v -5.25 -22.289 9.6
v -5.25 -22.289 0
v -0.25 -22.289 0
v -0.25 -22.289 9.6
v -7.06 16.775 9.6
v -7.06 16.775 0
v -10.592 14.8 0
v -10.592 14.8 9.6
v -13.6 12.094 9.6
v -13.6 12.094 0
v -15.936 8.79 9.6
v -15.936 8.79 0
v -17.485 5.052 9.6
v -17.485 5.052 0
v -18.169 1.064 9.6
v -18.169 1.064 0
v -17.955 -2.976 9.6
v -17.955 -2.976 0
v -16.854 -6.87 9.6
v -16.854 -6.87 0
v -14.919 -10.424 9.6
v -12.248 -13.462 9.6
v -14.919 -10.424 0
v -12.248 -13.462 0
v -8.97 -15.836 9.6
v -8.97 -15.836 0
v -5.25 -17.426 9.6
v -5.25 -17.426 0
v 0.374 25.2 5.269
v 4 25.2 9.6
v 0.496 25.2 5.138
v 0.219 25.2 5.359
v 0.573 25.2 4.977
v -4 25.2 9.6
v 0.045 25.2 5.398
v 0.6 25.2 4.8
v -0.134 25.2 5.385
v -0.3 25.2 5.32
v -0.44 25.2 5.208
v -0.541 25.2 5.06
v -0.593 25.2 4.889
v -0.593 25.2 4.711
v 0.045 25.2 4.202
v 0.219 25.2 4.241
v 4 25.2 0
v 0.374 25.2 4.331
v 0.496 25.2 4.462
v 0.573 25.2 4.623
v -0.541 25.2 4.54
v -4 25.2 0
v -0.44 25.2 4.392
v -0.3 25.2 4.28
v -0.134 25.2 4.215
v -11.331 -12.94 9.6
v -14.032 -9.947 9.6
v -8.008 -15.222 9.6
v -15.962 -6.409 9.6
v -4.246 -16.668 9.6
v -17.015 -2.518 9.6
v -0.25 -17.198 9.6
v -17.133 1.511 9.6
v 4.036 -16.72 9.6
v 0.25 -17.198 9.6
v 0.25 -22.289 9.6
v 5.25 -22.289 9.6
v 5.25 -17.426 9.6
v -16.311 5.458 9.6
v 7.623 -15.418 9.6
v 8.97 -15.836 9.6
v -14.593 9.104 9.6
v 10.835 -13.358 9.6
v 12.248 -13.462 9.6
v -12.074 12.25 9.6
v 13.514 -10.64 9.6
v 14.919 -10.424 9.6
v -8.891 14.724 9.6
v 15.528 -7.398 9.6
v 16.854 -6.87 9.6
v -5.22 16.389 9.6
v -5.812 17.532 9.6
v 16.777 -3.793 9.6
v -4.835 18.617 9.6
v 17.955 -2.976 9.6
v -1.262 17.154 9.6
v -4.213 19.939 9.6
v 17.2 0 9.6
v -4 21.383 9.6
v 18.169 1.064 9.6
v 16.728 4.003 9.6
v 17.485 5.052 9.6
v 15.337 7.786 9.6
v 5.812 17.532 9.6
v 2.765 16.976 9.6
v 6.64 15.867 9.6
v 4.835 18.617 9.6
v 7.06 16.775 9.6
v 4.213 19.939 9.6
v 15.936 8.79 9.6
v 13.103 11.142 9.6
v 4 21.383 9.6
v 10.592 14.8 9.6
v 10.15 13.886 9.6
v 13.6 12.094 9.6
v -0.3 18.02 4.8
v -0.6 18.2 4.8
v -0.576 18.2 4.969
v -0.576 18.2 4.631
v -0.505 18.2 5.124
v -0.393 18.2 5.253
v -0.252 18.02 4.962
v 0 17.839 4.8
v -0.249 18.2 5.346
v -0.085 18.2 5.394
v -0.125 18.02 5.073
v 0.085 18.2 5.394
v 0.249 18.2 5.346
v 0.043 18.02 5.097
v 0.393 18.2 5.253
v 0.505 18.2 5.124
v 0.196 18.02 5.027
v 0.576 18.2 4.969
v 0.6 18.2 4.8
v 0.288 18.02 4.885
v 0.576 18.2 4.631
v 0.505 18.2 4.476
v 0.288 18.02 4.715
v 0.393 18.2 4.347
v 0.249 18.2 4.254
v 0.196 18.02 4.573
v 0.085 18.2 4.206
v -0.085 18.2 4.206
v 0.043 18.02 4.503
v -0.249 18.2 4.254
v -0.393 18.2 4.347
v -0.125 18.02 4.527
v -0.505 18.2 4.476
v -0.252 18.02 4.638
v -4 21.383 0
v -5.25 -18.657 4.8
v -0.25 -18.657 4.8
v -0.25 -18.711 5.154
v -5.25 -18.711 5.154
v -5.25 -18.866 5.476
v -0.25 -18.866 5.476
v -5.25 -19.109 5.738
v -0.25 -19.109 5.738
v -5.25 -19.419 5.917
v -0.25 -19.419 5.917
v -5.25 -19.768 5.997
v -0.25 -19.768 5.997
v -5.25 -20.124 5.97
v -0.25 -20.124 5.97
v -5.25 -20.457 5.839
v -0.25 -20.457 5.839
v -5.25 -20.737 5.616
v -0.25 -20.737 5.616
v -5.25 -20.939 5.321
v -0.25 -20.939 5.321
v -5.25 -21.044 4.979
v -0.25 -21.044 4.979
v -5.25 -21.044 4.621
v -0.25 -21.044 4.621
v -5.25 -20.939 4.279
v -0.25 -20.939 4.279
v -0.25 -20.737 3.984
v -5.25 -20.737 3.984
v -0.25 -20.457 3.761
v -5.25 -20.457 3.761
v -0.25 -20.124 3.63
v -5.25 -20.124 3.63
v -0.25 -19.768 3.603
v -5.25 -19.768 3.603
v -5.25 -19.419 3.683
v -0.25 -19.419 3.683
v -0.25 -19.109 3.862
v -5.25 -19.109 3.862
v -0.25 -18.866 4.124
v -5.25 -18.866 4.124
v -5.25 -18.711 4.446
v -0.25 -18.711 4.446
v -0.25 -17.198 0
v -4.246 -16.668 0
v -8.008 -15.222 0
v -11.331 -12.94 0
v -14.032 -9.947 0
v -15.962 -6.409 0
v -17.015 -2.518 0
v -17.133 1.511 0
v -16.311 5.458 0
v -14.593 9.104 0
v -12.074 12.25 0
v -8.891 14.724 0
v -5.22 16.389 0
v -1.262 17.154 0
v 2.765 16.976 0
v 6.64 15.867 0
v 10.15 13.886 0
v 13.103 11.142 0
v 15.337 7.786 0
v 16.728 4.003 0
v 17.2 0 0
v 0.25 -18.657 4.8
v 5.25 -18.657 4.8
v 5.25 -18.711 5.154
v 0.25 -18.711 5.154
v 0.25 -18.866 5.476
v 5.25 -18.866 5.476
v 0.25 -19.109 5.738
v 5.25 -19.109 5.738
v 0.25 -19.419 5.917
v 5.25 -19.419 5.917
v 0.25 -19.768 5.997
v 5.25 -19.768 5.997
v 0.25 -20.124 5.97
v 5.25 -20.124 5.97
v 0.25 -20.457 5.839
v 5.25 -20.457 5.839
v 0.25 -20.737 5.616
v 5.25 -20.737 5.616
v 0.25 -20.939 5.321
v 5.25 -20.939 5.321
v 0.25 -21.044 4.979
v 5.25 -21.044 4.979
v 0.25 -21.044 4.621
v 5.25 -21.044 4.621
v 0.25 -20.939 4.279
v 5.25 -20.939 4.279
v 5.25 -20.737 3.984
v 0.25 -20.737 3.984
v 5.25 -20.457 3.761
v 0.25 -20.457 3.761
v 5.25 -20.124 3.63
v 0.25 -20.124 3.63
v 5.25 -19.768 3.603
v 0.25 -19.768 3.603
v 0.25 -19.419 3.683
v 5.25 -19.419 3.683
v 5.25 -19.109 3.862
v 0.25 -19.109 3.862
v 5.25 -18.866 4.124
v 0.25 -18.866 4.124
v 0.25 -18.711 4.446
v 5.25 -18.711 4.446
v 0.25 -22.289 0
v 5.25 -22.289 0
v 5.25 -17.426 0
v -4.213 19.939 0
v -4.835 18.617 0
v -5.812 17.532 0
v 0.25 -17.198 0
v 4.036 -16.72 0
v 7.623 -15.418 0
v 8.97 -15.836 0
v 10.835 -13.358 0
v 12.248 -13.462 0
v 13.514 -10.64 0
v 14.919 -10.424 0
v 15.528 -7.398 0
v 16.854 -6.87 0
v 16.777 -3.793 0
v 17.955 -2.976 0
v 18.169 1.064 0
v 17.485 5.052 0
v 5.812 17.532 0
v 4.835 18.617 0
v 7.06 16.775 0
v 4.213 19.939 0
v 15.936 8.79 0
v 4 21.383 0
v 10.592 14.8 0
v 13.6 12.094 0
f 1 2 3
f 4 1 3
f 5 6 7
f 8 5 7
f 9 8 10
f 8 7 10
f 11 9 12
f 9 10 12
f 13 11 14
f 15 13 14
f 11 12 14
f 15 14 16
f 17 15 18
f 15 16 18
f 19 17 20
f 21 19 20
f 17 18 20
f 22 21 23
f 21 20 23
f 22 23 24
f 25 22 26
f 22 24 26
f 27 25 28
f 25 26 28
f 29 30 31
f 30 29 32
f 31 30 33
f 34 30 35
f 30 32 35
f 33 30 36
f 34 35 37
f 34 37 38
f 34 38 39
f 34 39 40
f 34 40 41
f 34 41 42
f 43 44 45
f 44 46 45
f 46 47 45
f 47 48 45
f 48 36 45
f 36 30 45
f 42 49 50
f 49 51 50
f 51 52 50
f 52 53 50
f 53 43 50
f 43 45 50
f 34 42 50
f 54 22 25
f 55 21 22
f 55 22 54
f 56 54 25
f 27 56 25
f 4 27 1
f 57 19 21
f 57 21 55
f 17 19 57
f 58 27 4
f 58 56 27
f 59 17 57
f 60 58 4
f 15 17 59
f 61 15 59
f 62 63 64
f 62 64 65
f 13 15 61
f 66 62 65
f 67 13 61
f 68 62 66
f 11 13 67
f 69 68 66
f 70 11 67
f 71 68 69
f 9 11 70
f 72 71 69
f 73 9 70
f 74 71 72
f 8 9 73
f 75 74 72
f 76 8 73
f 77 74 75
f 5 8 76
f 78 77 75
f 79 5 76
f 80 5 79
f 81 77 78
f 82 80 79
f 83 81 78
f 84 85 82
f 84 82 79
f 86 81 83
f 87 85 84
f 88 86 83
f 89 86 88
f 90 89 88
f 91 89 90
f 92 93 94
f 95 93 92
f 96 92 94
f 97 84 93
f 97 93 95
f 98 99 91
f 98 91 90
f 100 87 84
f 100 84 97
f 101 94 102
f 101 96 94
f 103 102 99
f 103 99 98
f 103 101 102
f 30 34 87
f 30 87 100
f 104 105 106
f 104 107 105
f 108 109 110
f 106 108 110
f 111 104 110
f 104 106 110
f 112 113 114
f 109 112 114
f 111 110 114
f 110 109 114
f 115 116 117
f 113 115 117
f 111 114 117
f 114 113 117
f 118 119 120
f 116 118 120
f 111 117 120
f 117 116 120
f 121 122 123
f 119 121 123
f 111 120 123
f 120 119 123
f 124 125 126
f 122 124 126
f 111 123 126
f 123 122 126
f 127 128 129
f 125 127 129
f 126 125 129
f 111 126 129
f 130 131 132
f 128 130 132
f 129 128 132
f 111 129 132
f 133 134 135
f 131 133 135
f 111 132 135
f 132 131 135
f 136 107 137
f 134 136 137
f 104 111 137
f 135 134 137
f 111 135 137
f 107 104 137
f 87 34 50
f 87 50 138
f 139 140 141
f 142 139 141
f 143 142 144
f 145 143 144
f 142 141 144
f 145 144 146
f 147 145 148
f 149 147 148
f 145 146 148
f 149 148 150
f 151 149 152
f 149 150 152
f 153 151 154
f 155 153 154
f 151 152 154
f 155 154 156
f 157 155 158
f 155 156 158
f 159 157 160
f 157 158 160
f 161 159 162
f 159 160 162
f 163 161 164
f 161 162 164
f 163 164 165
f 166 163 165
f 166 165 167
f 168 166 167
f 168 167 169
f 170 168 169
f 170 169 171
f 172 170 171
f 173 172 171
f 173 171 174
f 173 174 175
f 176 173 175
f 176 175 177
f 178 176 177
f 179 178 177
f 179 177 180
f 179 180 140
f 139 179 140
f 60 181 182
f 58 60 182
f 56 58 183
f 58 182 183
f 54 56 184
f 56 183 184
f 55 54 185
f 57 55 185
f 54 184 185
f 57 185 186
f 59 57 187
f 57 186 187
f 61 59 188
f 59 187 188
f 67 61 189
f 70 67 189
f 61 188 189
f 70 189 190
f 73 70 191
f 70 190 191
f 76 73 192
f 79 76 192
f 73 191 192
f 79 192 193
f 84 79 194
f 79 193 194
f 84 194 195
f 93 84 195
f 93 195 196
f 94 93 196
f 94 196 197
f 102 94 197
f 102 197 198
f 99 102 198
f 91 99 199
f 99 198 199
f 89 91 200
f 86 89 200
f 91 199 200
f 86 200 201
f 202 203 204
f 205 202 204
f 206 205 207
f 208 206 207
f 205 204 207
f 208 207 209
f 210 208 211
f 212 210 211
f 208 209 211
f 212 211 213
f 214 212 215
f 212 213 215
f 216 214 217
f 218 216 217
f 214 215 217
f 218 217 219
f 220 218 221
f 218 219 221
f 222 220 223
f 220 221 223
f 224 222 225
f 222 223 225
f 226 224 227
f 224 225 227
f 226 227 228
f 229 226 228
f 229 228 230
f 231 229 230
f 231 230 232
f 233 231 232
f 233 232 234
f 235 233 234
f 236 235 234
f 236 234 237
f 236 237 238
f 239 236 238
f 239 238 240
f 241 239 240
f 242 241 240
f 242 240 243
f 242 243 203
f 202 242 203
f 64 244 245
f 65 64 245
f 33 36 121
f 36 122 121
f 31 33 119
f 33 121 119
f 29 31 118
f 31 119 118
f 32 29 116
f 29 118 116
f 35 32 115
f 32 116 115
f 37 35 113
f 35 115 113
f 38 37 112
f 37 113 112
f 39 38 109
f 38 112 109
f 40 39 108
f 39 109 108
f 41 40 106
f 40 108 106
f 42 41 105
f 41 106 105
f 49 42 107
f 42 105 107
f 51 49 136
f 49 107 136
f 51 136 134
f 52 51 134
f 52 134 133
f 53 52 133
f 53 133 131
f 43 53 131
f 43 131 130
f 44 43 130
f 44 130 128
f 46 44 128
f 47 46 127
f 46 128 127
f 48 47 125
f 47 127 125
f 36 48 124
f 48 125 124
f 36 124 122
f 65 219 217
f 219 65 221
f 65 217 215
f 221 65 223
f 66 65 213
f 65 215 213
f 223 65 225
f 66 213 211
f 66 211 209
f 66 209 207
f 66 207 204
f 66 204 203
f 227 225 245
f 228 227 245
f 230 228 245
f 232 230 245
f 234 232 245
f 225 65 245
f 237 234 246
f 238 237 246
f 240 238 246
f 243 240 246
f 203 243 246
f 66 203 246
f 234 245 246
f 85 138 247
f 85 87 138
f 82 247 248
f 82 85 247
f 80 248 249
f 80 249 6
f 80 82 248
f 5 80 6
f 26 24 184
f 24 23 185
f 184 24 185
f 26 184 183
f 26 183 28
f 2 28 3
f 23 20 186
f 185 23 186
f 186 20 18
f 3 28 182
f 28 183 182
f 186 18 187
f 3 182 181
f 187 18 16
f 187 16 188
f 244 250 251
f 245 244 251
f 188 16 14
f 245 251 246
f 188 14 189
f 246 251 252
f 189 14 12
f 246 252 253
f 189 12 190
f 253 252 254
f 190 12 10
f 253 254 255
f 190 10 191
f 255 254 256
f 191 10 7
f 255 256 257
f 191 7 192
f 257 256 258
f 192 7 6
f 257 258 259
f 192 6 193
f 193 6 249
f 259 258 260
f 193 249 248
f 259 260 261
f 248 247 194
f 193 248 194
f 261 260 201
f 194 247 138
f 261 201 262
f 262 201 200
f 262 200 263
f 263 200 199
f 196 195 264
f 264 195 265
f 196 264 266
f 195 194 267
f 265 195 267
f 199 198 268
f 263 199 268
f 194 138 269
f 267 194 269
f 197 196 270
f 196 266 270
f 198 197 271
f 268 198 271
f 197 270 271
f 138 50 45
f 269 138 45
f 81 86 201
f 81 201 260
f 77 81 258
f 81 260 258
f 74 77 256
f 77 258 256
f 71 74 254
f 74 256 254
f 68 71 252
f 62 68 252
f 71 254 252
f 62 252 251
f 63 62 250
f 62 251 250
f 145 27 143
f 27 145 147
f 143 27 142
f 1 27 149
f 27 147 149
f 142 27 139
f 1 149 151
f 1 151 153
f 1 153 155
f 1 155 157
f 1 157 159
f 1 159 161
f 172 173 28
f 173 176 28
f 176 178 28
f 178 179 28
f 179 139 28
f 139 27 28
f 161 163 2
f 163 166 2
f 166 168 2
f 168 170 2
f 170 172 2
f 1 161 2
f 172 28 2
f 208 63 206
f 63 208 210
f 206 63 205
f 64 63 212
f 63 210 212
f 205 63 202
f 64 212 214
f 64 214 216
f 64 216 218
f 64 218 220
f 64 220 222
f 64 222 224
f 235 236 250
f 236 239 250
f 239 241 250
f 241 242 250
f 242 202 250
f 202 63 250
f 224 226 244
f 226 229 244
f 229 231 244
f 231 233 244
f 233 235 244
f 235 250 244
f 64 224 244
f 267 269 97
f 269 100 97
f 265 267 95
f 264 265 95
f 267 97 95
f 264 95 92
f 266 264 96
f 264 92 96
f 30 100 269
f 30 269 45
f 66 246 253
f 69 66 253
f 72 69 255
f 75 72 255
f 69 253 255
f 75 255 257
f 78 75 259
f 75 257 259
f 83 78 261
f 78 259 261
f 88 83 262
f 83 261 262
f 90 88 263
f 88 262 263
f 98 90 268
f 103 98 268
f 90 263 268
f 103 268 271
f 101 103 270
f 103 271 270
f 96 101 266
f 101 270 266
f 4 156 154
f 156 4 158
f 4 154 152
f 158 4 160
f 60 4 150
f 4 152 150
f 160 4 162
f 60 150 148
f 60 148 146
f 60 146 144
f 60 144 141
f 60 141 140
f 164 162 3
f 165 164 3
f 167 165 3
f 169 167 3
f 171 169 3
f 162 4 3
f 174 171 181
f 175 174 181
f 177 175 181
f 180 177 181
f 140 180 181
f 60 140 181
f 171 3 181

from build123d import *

# Parameters (mm, degrees)
F1_DEPTH = 9.6
F3_D     = 2.4
F5_D     = 1.2
F5_DEPTH = 7
F5_TIP   = 0.3605163714
F6_R     = 5


with BuildPart() as f1:
    # F0 (on Top) → F1 (new body)
    with BuildSketch(Plane.XY):
        with BuildLine():
            Line((-4, 25.2), (-4, 17.754999296))
            ThreePointArc((-4, 17.754999296), (0, 18.2), (4, 17.754999296))
            Line((4, 17.754999296), (4, 25.2))
            Line((4, 25.2), (-4, 25.2))
        make_face()
        with BuildLine():
            ThreePointArc((-0.25, -17.1981830436), (-12.0735247546, 12.2503061186), (17.2, 0))
            ThreePointArc((17.2, 0), (12.2503061186, -12.0735247546), (0.25, -17.1981830436))
            Line((0.25, -17.1981830436), (0.25, -18.198282886))
            ThreePointArc((0.25, -18.198282886), (2.7769537313, -17.986898787), (5.25, -17.4263449983))
            ThreePointArc((5.25, -17.4263449983), (18.1885230733, 0.6462417596), (4, 17.754999296))
            ThreePointArc((4, 17.754999296), (0, 18.2), (-4, 17.754999296))
            ThreePointArc((-4, 17.754999296), (-18.1885230733, 0.6462417596), (-5.25, -17.4263449983))
            ThreePointArc((-5.25, -17.4263449983), (-2.7769537313, -17.986898787), (-0.25, -18.198282886))
            Line((-0.25, -18.198282886), (-0.25, -17.1981830436))
        make_face()
        with BuildLine():
            Line((-0.25, -22.2885478301), (-0.25, -18.198282886))
            ThreePointArc((-0.25, -18.198282886), (-2.7769537313, -17.986898787), (-5.25, -17.4263449983))
            Line((-5.25, -17.4263449983), (-5.25, -22.2885478301))
            Line((-5.25, -22.2885478301), (-0.25, -22.2885478301))
        make_face()
        with BuildLine():
            ThreePointArc((5.25, -17.4263449983), (2.7769537313, -17.986898787), (0.25, -18.198282886))
            Line((0.25, -18.198282886), (0.25, -22.2885478301))
            Line((0.25, -22.2885478301), (5.25, -22.2885478301))
            Line((5.25, -22.2885478301), (5.25, -17.4263449983))
        make_face()
    extrude(amount=F1_DEPTH)

    # F3 (through all)
    with Locations(Plane(origin=(-5.25, 0, 0), x_dir=(0, -1, 0), z_dir=(-1, 0, 0))):
        with Locations((19.8574464142, 4.8)):
            Hole(F3_D / 2)

    # F5
    with Locations(Plane(origin=(0, 25.2, 0), x_dir=(-1, 0, 0), z_dir=(0, 1, 0))):
        with Locations((0, 4.8)):
            Hole(F5_D / 2, depth=F5_DEPTH)
            with Locations((0, 0, -(F5_DEPTH + F5_TIP / 2))):  # 118° drill point
                Cone(0, F5_D / 2, F5_TIP, mode=Mode.SUBTRACT)

    # F6
    f6_edges = [f1.edges().sort_by_distance(p)[0] for p in [
        (-4, 17.754999, 4.8),
        (4, 17.754999, 4.8),
    ]]
    fillet(f6_edges, radius=F6_R)


solid = f1.part
